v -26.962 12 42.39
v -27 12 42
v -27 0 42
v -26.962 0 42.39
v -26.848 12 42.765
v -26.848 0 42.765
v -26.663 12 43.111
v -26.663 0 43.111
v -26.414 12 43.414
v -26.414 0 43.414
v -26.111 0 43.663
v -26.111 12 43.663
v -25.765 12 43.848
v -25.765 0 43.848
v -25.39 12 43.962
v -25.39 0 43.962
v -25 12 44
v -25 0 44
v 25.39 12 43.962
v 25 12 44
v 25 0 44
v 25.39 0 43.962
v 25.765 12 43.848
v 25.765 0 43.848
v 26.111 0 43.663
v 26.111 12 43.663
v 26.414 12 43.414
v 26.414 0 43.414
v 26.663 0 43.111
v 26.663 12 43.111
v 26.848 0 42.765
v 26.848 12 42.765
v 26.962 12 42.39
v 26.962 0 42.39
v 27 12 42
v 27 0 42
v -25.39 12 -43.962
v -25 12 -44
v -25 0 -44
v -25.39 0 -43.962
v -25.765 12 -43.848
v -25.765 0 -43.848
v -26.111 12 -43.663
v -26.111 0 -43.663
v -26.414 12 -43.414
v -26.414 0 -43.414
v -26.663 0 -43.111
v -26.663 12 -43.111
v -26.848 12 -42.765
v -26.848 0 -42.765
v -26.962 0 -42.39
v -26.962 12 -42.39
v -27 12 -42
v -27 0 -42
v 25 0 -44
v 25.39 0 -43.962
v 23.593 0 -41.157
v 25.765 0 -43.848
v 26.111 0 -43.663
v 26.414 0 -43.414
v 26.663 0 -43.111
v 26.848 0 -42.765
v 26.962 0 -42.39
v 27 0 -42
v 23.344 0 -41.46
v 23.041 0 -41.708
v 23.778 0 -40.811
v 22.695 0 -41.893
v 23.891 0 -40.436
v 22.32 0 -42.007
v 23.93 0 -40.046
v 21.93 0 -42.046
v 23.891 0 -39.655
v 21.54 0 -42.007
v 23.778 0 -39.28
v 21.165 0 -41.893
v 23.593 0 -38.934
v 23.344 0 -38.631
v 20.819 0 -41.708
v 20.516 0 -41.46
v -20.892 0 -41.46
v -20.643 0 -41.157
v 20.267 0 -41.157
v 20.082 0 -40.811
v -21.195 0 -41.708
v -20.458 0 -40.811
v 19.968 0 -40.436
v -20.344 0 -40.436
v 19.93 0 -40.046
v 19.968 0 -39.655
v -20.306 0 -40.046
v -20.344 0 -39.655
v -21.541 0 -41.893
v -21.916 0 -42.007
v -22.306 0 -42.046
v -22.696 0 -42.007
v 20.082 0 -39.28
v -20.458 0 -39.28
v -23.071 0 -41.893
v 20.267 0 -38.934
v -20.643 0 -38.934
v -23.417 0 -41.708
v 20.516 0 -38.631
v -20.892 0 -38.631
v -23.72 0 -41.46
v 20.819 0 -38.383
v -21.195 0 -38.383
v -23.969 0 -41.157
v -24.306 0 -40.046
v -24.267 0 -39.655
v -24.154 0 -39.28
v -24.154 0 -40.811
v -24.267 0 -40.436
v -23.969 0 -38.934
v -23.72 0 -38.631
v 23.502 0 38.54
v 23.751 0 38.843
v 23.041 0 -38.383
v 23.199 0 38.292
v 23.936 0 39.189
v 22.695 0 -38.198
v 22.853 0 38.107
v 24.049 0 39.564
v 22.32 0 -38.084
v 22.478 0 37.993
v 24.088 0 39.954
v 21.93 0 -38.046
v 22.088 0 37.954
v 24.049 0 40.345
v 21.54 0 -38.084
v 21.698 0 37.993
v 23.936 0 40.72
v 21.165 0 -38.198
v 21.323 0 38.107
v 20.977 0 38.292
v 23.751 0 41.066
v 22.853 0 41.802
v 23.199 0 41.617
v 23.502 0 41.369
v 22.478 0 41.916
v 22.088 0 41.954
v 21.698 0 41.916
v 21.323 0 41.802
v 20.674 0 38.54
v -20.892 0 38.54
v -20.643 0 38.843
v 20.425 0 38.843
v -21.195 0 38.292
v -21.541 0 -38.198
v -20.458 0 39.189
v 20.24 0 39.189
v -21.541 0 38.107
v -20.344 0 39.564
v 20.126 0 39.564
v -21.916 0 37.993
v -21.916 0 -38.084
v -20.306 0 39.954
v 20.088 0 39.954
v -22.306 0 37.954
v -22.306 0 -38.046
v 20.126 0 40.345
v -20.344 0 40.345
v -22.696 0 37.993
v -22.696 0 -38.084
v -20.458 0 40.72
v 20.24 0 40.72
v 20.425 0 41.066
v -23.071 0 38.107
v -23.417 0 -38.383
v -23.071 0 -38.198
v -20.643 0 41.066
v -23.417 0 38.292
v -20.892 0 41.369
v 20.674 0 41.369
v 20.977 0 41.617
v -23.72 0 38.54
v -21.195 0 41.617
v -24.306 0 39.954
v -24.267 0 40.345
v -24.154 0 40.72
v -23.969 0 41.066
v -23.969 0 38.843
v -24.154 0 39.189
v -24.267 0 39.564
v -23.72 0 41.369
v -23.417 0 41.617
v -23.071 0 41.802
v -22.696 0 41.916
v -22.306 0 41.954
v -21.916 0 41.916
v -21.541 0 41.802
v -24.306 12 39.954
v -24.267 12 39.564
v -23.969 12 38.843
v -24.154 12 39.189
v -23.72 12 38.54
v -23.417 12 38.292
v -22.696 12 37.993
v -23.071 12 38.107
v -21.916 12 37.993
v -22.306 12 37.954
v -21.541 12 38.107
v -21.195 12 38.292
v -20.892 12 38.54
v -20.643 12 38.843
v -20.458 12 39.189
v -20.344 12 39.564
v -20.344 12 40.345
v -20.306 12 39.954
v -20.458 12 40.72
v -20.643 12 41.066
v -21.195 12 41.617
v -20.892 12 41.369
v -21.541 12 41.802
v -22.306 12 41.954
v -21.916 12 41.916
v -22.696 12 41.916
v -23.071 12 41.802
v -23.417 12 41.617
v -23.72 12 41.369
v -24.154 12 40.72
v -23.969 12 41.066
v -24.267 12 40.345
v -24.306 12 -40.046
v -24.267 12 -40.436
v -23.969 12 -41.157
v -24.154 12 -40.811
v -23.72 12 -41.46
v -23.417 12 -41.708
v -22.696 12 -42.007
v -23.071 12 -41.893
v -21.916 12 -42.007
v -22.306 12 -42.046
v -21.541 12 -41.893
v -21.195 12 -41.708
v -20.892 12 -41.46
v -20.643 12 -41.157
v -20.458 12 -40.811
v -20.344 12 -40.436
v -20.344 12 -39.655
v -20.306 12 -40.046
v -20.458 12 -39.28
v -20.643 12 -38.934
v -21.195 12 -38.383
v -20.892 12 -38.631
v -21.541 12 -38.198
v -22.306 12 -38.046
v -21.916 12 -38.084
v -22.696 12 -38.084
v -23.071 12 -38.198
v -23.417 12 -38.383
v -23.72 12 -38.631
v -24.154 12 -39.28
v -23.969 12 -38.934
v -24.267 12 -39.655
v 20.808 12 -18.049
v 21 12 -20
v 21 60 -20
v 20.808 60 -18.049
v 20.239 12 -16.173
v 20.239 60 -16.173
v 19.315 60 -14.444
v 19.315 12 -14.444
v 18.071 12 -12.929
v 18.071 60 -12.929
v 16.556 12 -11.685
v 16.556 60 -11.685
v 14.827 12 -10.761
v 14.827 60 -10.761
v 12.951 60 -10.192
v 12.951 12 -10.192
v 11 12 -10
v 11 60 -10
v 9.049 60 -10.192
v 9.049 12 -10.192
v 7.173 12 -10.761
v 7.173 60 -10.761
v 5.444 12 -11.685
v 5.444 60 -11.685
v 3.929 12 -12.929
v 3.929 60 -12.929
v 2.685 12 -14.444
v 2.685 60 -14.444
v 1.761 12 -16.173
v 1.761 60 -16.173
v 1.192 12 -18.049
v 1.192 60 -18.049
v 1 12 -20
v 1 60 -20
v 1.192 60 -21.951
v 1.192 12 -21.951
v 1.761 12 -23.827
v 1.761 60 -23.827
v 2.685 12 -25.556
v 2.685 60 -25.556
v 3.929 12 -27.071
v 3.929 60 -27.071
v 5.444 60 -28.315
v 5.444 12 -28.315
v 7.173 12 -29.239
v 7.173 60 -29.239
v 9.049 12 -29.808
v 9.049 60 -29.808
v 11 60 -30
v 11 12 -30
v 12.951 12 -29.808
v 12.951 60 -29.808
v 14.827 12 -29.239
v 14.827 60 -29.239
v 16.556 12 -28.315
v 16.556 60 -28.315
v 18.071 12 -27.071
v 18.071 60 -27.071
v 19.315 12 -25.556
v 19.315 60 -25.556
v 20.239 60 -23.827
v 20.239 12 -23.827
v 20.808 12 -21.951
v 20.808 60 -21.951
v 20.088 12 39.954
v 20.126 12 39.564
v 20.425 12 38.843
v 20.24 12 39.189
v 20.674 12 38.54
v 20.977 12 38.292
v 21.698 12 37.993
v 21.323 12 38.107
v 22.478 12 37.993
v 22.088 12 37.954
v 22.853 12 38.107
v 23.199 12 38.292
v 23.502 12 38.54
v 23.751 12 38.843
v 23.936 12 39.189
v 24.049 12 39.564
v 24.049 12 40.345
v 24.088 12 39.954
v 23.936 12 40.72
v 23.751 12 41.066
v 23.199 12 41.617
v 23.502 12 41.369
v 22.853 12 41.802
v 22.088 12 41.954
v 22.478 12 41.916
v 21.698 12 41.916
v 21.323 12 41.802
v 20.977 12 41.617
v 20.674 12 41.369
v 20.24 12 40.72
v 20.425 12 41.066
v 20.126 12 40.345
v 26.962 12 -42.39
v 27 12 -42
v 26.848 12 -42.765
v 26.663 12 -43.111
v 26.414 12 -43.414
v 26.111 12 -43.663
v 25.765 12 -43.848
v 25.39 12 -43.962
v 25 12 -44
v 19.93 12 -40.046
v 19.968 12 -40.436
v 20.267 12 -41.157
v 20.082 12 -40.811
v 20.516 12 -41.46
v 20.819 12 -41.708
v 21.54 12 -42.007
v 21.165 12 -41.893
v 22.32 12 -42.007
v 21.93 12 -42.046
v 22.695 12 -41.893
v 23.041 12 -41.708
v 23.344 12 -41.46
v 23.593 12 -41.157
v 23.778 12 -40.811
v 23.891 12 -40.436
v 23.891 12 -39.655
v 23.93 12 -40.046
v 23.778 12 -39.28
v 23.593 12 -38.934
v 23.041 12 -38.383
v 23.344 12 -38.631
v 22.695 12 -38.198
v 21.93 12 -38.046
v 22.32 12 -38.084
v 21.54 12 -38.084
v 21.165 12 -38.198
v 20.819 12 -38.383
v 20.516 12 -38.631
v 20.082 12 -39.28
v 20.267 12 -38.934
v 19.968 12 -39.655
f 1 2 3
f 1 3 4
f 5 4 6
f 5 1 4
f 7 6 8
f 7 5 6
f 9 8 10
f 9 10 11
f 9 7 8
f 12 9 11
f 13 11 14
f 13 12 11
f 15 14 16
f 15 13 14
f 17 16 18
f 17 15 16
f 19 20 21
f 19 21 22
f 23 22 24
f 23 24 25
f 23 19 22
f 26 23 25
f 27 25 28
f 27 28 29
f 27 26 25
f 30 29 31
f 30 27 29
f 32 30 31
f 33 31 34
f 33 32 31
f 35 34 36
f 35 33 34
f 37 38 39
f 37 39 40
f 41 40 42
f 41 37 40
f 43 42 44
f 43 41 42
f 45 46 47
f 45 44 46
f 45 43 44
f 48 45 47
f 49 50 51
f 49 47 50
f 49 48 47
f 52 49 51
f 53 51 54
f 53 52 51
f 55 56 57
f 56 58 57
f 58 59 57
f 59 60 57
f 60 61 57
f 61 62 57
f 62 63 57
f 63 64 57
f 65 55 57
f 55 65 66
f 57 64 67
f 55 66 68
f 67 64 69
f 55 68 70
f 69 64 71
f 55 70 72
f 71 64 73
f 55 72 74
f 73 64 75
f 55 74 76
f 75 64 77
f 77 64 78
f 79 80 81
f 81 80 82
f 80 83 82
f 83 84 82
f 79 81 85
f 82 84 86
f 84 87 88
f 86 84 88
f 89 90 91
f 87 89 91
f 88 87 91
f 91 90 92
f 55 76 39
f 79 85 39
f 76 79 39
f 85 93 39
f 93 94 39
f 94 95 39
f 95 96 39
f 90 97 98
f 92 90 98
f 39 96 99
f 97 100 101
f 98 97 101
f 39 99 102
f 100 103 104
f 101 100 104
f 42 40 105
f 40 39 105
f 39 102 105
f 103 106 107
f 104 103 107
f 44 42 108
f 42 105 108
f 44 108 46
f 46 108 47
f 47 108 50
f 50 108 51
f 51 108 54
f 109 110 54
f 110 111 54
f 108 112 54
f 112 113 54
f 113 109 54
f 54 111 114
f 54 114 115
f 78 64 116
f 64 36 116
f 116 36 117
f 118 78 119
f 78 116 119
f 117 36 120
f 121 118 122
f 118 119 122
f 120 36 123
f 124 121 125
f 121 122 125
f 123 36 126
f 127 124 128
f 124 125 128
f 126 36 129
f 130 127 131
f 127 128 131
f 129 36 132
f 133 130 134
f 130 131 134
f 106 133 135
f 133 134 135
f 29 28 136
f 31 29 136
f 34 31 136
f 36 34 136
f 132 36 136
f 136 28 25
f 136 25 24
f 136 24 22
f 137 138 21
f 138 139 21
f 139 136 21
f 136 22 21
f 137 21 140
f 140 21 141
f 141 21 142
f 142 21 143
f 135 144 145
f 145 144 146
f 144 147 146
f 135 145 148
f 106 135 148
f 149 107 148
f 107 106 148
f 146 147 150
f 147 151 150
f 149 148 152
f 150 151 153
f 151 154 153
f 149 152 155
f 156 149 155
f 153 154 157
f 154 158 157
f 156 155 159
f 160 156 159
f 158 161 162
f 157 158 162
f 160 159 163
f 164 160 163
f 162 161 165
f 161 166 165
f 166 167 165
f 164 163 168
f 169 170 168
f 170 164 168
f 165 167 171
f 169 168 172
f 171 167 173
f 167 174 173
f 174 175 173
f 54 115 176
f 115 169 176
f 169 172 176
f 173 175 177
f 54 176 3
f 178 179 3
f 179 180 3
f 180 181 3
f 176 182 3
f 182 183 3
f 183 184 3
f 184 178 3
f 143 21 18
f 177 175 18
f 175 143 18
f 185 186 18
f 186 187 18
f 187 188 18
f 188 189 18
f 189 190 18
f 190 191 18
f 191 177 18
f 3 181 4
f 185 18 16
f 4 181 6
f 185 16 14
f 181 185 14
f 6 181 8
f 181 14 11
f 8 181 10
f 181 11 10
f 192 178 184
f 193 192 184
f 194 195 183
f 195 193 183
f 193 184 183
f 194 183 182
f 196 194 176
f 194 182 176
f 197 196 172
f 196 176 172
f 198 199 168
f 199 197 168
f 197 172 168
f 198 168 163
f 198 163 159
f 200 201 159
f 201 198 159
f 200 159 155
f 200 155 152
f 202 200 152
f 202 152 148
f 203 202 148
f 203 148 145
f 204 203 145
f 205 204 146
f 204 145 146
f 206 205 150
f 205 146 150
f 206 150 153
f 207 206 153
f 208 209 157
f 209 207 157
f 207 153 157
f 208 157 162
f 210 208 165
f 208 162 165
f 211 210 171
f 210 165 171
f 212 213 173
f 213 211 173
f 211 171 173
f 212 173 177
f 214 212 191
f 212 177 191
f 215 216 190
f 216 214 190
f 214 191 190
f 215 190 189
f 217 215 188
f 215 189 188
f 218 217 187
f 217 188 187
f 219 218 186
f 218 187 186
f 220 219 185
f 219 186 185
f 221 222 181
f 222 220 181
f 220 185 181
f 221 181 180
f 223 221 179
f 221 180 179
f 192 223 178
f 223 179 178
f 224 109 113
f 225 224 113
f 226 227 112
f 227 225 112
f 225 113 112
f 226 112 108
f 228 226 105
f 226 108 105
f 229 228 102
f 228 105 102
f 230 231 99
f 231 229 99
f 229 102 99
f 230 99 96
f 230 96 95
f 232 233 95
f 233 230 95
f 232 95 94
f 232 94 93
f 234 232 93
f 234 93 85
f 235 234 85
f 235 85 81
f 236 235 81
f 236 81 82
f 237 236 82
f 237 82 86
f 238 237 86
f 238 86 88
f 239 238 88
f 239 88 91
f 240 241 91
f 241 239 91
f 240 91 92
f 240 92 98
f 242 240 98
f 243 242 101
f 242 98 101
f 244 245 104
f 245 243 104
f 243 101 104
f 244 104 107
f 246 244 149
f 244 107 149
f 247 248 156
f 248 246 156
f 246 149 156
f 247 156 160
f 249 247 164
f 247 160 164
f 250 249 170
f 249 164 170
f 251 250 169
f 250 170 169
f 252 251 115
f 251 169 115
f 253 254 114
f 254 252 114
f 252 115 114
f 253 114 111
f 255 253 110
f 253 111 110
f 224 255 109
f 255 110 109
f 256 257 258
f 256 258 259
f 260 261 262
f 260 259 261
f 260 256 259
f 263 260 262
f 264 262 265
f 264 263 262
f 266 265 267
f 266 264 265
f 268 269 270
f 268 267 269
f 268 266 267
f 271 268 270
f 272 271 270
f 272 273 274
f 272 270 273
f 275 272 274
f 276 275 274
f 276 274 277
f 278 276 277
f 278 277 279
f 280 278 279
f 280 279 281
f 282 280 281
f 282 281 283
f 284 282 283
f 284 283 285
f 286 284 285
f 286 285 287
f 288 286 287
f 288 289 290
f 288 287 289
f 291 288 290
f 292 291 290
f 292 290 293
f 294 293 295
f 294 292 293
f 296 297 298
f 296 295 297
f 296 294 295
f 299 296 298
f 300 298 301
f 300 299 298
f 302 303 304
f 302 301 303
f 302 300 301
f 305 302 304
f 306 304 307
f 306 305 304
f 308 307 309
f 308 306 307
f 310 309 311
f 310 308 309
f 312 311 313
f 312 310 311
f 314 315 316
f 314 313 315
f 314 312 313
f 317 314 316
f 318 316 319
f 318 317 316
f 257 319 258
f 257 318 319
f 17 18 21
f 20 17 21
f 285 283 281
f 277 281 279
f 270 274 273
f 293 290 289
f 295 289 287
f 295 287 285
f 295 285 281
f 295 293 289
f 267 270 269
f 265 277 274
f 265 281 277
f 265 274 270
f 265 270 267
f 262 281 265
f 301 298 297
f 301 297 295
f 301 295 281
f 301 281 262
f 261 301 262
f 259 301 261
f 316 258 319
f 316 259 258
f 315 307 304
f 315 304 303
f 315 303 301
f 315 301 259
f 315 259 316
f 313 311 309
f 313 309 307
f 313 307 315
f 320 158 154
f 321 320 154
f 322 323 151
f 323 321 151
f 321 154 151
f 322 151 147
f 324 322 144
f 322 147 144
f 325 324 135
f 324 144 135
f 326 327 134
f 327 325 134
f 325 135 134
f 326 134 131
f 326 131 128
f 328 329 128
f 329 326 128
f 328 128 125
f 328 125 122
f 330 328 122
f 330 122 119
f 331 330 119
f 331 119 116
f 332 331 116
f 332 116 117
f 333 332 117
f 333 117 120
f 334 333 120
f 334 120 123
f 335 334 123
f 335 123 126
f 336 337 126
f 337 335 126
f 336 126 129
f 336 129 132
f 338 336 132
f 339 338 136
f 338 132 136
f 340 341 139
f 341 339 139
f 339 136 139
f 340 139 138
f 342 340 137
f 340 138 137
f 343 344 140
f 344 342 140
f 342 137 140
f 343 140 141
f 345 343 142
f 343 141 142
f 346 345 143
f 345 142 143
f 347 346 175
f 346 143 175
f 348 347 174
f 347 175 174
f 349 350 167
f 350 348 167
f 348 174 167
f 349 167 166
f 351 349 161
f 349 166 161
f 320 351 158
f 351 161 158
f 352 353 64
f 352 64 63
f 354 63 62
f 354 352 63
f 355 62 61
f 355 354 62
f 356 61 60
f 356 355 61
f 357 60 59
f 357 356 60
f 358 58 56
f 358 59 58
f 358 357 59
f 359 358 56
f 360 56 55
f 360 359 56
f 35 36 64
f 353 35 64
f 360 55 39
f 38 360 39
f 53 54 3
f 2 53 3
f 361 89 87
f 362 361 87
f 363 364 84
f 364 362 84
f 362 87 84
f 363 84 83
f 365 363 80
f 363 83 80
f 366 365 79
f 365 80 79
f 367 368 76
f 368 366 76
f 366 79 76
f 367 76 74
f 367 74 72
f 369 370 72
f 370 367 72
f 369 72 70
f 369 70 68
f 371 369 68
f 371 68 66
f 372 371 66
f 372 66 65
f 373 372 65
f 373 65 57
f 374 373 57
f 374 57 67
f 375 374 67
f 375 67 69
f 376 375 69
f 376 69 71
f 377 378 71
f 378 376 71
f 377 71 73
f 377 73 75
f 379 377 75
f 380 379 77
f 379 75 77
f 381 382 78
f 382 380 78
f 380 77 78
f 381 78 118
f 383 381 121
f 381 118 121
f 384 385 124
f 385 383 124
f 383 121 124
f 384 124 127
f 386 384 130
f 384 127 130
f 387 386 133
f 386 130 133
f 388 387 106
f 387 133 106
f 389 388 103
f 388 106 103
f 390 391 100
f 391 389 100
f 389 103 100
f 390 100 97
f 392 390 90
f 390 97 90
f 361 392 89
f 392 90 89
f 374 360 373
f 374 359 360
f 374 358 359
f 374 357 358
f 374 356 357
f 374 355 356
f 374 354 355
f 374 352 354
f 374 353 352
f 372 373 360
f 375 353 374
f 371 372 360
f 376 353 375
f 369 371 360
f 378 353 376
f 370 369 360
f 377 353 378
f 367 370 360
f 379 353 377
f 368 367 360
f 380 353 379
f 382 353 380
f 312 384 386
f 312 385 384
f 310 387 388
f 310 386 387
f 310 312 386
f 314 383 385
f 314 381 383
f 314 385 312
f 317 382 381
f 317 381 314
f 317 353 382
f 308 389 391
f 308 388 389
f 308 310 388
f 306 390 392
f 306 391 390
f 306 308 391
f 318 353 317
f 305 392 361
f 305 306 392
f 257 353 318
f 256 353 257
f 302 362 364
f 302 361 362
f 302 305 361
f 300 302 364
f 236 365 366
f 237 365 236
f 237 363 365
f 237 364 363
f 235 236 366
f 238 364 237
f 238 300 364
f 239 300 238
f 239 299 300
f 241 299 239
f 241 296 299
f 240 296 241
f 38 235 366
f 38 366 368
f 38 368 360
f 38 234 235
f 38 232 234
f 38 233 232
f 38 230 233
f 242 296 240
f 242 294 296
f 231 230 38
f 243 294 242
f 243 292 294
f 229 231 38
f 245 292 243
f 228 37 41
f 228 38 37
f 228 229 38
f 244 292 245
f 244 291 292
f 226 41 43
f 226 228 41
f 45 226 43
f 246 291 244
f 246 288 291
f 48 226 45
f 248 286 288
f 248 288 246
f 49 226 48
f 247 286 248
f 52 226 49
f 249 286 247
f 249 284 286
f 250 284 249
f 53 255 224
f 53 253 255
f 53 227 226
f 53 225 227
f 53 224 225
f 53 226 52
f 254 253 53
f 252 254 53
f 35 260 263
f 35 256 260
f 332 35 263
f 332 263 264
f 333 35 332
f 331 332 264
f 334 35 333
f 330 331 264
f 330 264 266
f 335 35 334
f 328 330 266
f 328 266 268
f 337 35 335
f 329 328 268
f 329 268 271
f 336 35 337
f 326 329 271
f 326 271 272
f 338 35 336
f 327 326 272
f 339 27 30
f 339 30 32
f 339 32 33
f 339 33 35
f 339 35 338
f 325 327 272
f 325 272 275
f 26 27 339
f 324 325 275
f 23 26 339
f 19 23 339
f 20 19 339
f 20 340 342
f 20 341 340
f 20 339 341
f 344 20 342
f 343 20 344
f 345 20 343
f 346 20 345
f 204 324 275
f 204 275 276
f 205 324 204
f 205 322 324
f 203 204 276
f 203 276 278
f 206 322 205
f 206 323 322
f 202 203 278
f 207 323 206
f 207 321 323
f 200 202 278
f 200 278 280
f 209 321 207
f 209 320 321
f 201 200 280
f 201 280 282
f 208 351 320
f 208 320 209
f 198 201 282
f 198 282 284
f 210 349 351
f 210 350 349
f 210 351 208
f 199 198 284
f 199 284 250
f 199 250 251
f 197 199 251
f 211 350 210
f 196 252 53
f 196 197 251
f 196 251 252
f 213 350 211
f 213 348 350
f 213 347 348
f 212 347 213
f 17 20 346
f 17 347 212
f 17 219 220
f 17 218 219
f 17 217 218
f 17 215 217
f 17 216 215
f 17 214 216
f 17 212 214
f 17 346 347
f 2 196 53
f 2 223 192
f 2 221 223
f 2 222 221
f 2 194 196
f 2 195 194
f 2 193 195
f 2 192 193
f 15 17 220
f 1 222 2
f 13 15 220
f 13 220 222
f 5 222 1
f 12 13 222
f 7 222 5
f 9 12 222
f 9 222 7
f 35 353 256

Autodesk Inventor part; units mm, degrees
ref_plane "YZ Plane" through (0, 0, 0) normal (1, 0, 0) x (0, 1, 0)
ref_plane "XZ Plane" through (0, 0, 0) normal (0, 1, 0) x (-1, 0, 0)
sketch "Sketch1" plane through (0, 0, 0) normal (0, 1, 0) x (-1, 0, 0)
  line L0 (27, 44) -> (-27, 44)
  line L1 (-27, 44) -> (-27, -44)
  line L2 (-27, -44) -> (27, -44)
  line L3 (27, -44) -> (27, 44)
  line L4 (27, 44) -> (-27, -44) construction
  line L5 (-27, 44) -> (27, -44) construction
  circle A0 centre (22.3059, 39.9545) radius 2
  circle A1 centre (-22.0879, 39.9545) radius 2
  circle A2 centre (-21.9299, -40.0455) radius 2
  circle A3 centre (22.3059, -40.0455) radius 2
  point P0 (0, 0)
  dimension "d0" = 54
  dimension "d6" = 4
  dimension "d7" = 4
  dimension "d8" = 4
  dimension "d9" = 4
  dimension "d17" = 88
  dimension "d19" = 80
extrude "Extrusion1" add sketch "Sketch1" along normal blind 12
ref_plane "Work Plane1" through (0, 12, 0) normal (0, 1, 0) x (1, 0, 0)
sketch "Sketch2" plane through (0, 12, 0) normal (0, 1, 0) x (1, 0, 0)
  circle A0 centre (11, 20) radius 10
  point P0 (0, 0)
  dimension "d14" = 20
extrude "Extrusion2" add sketch "Sketch2" along normal blind 48
fillet "Fillet1" radius 2 4 edges at (27, 6, 44) (27, 6, -44) (-27, 6, 44) (-27, 6, -44)
properties part number "sensor 2"
